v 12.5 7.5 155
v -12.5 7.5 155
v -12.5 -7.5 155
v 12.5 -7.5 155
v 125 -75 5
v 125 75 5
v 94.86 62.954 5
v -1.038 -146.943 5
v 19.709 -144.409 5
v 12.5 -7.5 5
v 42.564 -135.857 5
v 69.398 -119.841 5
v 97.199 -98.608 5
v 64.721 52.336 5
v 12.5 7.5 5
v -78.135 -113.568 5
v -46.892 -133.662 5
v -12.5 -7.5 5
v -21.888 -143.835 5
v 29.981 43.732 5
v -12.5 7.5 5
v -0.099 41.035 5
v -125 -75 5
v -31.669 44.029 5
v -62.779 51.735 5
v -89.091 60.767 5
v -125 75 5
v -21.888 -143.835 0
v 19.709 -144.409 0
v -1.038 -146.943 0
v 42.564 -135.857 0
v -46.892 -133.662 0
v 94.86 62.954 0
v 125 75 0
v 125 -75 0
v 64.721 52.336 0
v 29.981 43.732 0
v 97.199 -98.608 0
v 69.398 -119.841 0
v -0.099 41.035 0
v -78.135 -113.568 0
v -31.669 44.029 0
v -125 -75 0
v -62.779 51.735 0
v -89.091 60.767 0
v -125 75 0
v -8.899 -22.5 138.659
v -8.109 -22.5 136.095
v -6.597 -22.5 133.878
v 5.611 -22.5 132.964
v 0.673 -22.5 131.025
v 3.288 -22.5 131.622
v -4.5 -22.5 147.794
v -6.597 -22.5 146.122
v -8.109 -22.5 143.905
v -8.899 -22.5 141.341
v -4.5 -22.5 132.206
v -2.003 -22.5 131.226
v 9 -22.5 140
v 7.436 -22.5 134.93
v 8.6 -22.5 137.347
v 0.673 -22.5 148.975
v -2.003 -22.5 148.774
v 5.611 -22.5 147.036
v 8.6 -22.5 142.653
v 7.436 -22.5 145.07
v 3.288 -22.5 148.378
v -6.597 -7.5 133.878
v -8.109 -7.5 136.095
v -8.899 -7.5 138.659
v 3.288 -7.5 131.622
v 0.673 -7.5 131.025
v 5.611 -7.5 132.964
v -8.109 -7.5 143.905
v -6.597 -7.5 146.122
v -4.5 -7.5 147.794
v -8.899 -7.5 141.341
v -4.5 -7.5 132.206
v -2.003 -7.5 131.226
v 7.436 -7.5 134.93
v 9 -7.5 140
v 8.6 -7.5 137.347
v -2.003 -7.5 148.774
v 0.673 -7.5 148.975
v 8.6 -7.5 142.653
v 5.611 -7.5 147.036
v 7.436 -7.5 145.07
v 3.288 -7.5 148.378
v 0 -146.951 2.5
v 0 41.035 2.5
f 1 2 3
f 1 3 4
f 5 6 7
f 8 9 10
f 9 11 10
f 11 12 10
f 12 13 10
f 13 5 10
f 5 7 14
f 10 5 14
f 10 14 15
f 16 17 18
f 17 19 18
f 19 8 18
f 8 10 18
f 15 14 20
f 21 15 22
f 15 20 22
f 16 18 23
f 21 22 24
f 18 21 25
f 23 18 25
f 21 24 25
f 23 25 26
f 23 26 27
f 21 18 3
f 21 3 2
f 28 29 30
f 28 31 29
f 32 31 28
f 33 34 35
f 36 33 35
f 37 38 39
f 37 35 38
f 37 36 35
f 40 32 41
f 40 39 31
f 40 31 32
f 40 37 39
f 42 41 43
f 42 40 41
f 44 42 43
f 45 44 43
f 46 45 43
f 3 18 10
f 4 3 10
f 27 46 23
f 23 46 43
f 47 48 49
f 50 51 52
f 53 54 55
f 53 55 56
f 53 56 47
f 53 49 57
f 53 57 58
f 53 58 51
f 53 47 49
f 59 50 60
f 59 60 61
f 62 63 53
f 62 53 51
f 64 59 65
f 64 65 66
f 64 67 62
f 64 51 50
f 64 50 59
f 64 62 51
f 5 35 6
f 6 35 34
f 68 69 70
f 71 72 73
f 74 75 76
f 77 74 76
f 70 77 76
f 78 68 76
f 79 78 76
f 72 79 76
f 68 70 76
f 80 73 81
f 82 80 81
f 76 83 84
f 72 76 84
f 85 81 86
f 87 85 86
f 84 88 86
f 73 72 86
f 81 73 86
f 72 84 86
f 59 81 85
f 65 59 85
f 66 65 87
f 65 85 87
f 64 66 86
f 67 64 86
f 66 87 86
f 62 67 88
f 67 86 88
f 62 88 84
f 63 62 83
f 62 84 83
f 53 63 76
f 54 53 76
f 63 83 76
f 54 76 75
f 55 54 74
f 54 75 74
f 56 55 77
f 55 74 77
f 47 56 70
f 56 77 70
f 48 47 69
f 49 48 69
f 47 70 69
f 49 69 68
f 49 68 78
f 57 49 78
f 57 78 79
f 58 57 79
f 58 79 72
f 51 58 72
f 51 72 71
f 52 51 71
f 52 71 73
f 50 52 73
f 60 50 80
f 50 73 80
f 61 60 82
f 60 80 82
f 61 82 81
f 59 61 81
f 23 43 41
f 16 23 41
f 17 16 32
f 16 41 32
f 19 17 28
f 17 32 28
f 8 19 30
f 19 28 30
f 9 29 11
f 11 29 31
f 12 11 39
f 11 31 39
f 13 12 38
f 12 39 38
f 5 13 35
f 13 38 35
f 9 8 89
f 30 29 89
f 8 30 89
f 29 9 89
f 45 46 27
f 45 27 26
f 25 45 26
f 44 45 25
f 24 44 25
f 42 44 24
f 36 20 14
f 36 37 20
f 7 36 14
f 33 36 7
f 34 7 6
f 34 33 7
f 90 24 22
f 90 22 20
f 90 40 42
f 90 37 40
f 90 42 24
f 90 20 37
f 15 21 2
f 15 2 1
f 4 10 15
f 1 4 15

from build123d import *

# Parameters (mm, degrees)
F1_DEPTH = 5
F2_W     = 25
F2_H     = 15
F3_DEPTH = 150
F4_R     = 9
F5_DEPTH = 15


with BuildPart() as f1:
    # F0 (on Top) → F1 (new body)
    with BuildSketch(Plane.XY):
        with BuildLine():
            add(Edge.make_bspline(
                [(-124.999996, 75), (-83.333332, 58.017569), (3e-06, 24.052707), (83.333335, 58.017569), (125.000004, 75)],
                knots=[0, 0, 0, 0, 129.532278, 259.064562, 259.064562, 259.064562, 259.064562], degree=3))
            Line((-124.999996, 75), (-125.000004, -75))
            add(Edge.make_bspline(
                [(-125.000004, -75), (-83.333335, -110.975347), (-2e-06, -182.926038), (83.333332, -110.975345), (124.999996, -75)],
                knots=[0, 0, 0, 0, 144.228648, 288.45729, 288.45729, 288.45729, 288.45729], degree=3))
            Line((124.999996, -75), (125.000004, 75))
        make_face()
    extrude(amount=F1_DEPTH)

    # F2 (on face) → F3 (join)
    with BuildSketch(Plane.XY.offset(5)):
        Rectangle(F2_W, F2_H)
    extrude(amount=F3_DEPTH)


with BuildPart() as f5:
    # F4 (on face) → F5 (new body)
    with BuildSketch(Plane.XZ.offset(7.5)):
        with Locations((0, 140)):
            Circle(F4_R)
    extrude(amount=F5_DEPTH)


solid = Compound([f1.part, f5.part])
